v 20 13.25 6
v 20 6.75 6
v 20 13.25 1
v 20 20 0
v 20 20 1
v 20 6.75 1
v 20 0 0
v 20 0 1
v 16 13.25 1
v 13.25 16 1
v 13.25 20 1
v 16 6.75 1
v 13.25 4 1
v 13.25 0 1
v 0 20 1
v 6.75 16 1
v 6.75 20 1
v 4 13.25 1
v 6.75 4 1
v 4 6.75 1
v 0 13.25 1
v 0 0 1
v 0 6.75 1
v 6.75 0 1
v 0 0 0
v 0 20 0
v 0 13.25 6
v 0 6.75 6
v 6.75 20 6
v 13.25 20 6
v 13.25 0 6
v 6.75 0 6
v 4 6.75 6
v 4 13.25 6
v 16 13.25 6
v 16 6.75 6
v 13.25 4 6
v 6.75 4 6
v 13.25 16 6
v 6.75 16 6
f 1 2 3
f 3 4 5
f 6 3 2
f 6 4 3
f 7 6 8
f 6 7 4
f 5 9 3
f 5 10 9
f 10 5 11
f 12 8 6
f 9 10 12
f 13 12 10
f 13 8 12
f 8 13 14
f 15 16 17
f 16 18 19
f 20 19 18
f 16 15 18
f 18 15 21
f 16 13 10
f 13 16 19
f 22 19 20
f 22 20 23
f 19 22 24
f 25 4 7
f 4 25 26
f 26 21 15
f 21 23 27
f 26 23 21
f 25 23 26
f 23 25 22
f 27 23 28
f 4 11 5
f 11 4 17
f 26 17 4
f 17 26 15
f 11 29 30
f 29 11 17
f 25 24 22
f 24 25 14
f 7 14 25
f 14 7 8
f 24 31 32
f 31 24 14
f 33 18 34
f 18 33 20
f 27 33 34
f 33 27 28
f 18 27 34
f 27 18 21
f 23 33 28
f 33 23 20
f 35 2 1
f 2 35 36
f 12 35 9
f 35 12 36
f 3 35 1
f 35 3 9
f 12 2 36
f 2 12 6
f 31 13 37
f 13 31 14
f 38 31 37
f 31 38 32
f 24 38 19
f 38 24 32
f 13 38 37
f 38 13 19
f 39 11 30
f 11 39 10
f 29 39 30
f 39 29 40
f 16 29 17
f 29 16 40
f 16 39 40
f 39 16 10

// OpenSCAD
//Specify the height
Height = 1 ; // [1:0.25:5]

2020_ProfileEndcap ();

module 2020_ProfileEndcap() {
    difference () {
        union () {
            translate ([0,0,0]) cube ([20,20,Height]);

            translate ([0,6.75,Height]) cube ([4,6.5,5]);
            translate ([16,6.75,Height]) cube ([4,6.5,5]);

            translate ([6.75,0,Height]) cube ([6.5,4,5]);
            translate ([6.75,16,Height]) cube ([6.5,4,5]);

        }
        *translate ([10,10,-2.5]) rotate ([0,0,0]) cylinder (d=InnerDiameter,h=10);
    }
}
